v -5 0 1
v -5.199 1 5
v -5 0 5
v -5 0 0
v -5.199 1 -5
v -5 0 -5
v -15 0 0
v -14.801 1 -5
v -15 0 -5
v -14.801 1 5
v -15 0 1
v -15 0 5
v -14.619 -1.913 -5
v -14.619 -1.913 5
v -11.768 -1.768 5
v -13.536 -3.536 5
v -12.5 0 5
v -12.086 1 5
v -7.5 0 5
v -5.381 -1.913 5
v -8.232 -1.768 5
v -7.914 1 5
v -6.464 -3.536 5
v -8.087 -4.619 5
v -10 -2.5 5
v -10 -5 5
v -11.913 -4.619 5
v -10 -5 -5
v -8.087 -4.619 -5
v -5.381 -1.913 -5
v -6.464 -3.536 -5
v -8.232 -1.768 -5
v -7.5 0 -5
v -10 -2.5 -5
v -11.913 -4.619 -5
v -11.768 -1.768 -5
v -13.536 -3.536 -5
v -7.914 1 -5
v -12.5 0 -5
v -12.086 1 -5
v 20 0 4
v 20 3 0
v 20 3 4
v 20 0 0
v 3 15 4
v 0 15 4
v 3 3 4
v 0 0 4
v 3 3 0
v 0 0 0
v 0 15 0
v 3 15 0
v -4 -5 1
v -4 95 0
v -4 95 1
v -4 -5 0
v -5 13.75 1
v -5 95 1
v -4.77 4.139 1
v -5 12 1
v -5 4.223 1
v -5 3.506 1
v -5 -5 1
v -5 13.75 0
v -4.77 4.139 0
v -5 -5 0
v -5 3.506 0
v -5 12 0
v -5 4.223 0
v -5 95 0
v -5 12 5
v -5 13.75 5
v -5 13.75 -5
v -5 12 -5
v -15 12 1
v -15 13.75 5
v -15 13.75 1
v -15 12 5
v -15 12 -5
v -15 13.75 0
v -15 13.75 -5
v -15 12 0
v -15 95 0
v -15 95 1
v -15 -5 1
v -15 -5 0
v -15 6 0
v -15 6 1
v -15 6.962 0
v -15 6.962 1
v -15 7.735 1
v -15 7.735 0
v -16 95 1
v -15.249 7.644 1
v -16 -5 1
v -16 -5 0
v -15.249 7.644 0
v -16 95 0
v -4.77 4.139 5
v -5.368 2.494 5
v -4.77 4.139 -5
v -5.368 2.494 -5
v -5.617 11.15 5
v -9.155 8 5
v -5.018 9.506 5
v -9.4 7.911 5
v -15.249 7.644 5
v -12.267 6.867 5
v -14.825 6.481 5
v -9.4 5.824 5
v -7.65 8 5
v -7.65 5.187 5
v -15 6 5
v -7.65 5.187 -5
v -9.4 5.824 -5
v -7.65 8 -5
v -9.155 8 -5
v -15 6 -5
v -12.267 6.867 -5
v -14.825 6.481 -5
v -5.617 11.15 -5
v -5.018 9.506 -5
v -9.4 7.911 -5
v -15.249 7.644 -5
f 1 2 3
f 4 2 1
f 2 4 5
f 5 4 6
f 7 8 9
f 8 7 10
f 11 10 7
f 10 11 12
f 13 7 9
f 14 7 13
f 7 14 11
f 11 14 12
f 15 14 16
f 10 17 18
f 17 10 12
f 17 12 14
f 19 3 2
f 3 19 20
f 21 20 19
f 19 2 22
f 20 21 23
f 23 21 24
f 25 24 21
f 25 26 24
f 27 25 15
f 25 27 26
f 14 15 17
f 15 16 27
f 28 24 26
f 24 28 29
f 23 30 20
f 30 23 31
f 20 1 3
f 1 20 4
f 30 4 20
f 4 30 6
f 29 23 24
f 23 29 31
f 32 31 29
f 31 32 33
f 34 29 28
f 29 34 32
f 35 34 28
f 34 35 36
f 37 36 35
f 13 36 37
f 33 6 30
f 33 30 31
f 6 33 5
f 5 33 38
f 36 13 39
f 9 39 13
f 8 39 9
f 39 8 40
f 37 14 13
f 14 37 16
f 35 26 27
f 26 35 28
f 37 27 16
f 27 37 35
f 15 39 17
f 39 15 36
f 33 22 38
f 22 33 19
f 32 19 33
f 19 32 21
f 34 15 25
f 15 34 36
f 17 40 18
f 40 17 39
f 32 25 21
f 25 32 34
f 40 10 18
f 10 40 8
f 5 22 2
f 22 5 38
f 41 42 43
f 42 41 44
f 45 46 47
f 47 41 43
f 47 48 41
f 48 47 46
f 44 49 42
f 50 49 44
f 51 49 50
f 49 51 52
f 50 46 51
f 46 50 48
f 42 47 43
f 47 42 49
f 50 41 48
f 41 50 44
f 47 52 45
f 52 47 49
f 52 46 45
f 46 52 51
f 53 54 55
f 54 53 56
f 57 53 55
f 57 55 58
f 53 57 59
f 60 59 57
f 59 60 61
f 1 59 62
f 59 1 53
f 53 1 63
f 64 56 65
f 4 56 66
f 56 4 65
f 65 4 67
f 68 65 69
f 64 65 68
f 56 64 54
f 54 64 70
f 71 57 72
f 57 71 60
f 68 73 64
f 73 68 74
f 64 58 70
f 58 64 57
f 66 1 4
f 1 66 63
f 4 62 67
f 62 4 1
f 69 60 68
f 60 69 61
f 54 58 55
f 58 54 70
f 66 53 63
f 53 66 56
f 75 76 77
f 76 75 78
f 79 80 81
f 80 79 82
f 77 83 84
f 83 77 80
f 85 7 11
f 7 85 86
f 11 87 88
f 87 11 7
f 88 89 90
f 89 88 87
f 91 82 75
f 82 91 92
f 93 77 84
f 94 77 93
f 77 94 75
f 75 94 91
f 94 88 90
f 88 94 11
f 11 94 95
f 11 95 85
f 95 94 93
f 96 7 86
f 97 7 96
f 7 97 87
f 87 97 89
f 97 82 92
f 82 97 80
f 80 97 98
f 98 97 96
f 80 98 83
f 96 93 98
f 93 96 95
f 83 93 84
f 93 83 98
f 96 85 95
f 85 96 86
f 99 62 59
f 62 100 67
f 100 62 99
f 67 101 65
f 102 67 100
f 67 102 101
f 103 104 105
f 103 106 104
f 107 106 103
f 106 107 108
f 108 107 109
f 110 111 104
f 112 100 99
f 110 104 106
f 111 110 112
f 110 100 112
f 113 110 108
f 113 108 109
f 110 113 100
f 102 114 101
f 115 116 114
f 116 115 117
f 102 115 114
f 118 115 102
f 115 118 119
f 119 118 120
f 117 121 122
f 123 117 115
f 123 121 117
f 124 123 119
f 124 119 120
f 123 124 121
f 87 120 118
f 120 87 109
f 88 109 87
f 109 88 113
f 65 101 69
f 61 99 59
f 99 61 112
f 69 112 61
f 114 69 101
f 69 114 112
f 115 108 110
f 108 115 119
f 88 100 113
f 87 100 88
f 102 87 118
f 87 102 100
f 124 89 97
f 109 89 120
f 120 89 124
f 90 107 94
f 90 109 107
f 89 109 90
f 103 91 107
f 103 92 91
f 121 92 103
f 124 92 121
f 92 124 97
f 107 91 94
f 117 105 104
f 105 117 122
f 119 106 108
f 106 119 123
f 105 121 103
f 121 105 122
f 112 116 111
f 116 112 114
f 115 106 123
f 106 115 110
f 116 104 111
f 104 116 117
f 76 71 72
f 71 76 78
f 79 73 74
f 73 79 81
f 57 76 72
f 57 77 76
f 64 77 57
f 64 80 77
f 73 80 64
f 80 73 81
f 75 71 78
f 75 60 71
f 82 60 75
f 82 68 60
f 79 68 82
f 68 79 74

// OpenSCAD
cube([20,3,4]);
//test on the bottom
translate([0,3,0]) {
	cube([3,12,4]);
}

//bottom bounding line
translate([-5, -5, 0]) {
   color("black") {
	cube([1, 100, 1]);
   }
}

//top bounding line
translate([-16, -5, 0]) {
	color("black") {
		cube([1, 100, 1]);
   }
}

//C
translate([-10, 0, 0]) {
   difference() {
   difference() {
		cylinder(h = 10, d1 = 10, d2 = 10, center = true);
      cylinder(h = 10, d1 = 5, d2 = 5, center = true);
	}
   translate([-5, 1, -5]) {
   cube([10, 10, 10]);
   }
   }
}

//A
translate([-15, 6, -5]) {
   rotate(-20) {
 	cube([10.25, 1.75, 10]);
   }
}

translate([-14.65, 6, -5]) {
	rotate(20) {
		cube([10.25, 1.75, 10]);
   }
}

//crossbar of A
translate([-9.4, 5, -5]) {
	cube([1.75, 3, 10]);
}

//end A

//R
translate([-15, 12, -5]) {
	cube([10, 1.75, 10]);
}
